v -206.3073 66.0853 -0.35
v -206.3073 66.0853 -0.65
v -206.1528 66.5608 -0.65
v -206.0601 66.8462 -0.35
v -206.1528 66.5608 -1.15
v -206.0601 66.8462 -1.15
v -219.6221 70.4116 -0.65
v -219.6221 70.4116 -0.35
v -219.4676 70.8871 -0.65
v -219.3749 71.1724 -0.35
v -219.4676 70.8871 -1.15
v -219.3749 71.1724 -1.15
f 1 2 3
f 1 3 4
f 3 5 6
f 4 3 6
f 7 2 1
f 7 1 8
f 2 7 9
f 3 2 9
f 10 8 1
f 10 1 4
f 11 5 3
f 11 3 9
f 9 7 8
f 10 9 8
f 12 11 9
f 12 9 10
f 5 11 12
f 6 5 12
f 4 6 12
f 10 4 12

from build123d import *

# Parameters (mm, degrees)
BOX111_W               = 0.8
BOX111_H               = 17
BOX111_DEPTH           = 0.8
BOX112_W               = 0.8
BOX112_H               = 14
BOX112_DEPTH           = 0.8
CUT059_PLACEMENT_ANGLE = 72


with BuildPart() as cubo111:
    # Box111 → Box111 (new body)
    with BuildSketch(Plane.XY):
        with Locations((0.4, 8.5)):
            Rectangle(BOX111_W, BOX111_H)
    extrude(amount=BOX111_DEPTH)


with BuildPart() as perfil_l_2da_cara001:
    # Box112 → Box112 (new body)
    with BuildSketch(Plane(origin=(0.3, 0, 0.3), x_dir=(1, 0, 0), z_dir=(0, 0, 1))):
        with Locations((0.4, 7)):
            Rectangle(BOX112_W, BOX112_H)
    extrude(amount=BOX112_DEPTH)

    # Cut059: cut Cubo111
    add(cubo111.part, mode=Mode.SUBTRACT)


with BuildPart() as perfil_l_2da_cara001_1:
    # Cut059 placement: moved
    add(perfil_l_2da_cara001.part.moved(Location((-206.4, 65.8, -1.45))).rotate(Axis((-206.4, 65.8, -1.45), (0, 0, 1)), CUT059_PLACEMENT_ANGLE))


solid = perfil_l_2da_cara001_1.part
